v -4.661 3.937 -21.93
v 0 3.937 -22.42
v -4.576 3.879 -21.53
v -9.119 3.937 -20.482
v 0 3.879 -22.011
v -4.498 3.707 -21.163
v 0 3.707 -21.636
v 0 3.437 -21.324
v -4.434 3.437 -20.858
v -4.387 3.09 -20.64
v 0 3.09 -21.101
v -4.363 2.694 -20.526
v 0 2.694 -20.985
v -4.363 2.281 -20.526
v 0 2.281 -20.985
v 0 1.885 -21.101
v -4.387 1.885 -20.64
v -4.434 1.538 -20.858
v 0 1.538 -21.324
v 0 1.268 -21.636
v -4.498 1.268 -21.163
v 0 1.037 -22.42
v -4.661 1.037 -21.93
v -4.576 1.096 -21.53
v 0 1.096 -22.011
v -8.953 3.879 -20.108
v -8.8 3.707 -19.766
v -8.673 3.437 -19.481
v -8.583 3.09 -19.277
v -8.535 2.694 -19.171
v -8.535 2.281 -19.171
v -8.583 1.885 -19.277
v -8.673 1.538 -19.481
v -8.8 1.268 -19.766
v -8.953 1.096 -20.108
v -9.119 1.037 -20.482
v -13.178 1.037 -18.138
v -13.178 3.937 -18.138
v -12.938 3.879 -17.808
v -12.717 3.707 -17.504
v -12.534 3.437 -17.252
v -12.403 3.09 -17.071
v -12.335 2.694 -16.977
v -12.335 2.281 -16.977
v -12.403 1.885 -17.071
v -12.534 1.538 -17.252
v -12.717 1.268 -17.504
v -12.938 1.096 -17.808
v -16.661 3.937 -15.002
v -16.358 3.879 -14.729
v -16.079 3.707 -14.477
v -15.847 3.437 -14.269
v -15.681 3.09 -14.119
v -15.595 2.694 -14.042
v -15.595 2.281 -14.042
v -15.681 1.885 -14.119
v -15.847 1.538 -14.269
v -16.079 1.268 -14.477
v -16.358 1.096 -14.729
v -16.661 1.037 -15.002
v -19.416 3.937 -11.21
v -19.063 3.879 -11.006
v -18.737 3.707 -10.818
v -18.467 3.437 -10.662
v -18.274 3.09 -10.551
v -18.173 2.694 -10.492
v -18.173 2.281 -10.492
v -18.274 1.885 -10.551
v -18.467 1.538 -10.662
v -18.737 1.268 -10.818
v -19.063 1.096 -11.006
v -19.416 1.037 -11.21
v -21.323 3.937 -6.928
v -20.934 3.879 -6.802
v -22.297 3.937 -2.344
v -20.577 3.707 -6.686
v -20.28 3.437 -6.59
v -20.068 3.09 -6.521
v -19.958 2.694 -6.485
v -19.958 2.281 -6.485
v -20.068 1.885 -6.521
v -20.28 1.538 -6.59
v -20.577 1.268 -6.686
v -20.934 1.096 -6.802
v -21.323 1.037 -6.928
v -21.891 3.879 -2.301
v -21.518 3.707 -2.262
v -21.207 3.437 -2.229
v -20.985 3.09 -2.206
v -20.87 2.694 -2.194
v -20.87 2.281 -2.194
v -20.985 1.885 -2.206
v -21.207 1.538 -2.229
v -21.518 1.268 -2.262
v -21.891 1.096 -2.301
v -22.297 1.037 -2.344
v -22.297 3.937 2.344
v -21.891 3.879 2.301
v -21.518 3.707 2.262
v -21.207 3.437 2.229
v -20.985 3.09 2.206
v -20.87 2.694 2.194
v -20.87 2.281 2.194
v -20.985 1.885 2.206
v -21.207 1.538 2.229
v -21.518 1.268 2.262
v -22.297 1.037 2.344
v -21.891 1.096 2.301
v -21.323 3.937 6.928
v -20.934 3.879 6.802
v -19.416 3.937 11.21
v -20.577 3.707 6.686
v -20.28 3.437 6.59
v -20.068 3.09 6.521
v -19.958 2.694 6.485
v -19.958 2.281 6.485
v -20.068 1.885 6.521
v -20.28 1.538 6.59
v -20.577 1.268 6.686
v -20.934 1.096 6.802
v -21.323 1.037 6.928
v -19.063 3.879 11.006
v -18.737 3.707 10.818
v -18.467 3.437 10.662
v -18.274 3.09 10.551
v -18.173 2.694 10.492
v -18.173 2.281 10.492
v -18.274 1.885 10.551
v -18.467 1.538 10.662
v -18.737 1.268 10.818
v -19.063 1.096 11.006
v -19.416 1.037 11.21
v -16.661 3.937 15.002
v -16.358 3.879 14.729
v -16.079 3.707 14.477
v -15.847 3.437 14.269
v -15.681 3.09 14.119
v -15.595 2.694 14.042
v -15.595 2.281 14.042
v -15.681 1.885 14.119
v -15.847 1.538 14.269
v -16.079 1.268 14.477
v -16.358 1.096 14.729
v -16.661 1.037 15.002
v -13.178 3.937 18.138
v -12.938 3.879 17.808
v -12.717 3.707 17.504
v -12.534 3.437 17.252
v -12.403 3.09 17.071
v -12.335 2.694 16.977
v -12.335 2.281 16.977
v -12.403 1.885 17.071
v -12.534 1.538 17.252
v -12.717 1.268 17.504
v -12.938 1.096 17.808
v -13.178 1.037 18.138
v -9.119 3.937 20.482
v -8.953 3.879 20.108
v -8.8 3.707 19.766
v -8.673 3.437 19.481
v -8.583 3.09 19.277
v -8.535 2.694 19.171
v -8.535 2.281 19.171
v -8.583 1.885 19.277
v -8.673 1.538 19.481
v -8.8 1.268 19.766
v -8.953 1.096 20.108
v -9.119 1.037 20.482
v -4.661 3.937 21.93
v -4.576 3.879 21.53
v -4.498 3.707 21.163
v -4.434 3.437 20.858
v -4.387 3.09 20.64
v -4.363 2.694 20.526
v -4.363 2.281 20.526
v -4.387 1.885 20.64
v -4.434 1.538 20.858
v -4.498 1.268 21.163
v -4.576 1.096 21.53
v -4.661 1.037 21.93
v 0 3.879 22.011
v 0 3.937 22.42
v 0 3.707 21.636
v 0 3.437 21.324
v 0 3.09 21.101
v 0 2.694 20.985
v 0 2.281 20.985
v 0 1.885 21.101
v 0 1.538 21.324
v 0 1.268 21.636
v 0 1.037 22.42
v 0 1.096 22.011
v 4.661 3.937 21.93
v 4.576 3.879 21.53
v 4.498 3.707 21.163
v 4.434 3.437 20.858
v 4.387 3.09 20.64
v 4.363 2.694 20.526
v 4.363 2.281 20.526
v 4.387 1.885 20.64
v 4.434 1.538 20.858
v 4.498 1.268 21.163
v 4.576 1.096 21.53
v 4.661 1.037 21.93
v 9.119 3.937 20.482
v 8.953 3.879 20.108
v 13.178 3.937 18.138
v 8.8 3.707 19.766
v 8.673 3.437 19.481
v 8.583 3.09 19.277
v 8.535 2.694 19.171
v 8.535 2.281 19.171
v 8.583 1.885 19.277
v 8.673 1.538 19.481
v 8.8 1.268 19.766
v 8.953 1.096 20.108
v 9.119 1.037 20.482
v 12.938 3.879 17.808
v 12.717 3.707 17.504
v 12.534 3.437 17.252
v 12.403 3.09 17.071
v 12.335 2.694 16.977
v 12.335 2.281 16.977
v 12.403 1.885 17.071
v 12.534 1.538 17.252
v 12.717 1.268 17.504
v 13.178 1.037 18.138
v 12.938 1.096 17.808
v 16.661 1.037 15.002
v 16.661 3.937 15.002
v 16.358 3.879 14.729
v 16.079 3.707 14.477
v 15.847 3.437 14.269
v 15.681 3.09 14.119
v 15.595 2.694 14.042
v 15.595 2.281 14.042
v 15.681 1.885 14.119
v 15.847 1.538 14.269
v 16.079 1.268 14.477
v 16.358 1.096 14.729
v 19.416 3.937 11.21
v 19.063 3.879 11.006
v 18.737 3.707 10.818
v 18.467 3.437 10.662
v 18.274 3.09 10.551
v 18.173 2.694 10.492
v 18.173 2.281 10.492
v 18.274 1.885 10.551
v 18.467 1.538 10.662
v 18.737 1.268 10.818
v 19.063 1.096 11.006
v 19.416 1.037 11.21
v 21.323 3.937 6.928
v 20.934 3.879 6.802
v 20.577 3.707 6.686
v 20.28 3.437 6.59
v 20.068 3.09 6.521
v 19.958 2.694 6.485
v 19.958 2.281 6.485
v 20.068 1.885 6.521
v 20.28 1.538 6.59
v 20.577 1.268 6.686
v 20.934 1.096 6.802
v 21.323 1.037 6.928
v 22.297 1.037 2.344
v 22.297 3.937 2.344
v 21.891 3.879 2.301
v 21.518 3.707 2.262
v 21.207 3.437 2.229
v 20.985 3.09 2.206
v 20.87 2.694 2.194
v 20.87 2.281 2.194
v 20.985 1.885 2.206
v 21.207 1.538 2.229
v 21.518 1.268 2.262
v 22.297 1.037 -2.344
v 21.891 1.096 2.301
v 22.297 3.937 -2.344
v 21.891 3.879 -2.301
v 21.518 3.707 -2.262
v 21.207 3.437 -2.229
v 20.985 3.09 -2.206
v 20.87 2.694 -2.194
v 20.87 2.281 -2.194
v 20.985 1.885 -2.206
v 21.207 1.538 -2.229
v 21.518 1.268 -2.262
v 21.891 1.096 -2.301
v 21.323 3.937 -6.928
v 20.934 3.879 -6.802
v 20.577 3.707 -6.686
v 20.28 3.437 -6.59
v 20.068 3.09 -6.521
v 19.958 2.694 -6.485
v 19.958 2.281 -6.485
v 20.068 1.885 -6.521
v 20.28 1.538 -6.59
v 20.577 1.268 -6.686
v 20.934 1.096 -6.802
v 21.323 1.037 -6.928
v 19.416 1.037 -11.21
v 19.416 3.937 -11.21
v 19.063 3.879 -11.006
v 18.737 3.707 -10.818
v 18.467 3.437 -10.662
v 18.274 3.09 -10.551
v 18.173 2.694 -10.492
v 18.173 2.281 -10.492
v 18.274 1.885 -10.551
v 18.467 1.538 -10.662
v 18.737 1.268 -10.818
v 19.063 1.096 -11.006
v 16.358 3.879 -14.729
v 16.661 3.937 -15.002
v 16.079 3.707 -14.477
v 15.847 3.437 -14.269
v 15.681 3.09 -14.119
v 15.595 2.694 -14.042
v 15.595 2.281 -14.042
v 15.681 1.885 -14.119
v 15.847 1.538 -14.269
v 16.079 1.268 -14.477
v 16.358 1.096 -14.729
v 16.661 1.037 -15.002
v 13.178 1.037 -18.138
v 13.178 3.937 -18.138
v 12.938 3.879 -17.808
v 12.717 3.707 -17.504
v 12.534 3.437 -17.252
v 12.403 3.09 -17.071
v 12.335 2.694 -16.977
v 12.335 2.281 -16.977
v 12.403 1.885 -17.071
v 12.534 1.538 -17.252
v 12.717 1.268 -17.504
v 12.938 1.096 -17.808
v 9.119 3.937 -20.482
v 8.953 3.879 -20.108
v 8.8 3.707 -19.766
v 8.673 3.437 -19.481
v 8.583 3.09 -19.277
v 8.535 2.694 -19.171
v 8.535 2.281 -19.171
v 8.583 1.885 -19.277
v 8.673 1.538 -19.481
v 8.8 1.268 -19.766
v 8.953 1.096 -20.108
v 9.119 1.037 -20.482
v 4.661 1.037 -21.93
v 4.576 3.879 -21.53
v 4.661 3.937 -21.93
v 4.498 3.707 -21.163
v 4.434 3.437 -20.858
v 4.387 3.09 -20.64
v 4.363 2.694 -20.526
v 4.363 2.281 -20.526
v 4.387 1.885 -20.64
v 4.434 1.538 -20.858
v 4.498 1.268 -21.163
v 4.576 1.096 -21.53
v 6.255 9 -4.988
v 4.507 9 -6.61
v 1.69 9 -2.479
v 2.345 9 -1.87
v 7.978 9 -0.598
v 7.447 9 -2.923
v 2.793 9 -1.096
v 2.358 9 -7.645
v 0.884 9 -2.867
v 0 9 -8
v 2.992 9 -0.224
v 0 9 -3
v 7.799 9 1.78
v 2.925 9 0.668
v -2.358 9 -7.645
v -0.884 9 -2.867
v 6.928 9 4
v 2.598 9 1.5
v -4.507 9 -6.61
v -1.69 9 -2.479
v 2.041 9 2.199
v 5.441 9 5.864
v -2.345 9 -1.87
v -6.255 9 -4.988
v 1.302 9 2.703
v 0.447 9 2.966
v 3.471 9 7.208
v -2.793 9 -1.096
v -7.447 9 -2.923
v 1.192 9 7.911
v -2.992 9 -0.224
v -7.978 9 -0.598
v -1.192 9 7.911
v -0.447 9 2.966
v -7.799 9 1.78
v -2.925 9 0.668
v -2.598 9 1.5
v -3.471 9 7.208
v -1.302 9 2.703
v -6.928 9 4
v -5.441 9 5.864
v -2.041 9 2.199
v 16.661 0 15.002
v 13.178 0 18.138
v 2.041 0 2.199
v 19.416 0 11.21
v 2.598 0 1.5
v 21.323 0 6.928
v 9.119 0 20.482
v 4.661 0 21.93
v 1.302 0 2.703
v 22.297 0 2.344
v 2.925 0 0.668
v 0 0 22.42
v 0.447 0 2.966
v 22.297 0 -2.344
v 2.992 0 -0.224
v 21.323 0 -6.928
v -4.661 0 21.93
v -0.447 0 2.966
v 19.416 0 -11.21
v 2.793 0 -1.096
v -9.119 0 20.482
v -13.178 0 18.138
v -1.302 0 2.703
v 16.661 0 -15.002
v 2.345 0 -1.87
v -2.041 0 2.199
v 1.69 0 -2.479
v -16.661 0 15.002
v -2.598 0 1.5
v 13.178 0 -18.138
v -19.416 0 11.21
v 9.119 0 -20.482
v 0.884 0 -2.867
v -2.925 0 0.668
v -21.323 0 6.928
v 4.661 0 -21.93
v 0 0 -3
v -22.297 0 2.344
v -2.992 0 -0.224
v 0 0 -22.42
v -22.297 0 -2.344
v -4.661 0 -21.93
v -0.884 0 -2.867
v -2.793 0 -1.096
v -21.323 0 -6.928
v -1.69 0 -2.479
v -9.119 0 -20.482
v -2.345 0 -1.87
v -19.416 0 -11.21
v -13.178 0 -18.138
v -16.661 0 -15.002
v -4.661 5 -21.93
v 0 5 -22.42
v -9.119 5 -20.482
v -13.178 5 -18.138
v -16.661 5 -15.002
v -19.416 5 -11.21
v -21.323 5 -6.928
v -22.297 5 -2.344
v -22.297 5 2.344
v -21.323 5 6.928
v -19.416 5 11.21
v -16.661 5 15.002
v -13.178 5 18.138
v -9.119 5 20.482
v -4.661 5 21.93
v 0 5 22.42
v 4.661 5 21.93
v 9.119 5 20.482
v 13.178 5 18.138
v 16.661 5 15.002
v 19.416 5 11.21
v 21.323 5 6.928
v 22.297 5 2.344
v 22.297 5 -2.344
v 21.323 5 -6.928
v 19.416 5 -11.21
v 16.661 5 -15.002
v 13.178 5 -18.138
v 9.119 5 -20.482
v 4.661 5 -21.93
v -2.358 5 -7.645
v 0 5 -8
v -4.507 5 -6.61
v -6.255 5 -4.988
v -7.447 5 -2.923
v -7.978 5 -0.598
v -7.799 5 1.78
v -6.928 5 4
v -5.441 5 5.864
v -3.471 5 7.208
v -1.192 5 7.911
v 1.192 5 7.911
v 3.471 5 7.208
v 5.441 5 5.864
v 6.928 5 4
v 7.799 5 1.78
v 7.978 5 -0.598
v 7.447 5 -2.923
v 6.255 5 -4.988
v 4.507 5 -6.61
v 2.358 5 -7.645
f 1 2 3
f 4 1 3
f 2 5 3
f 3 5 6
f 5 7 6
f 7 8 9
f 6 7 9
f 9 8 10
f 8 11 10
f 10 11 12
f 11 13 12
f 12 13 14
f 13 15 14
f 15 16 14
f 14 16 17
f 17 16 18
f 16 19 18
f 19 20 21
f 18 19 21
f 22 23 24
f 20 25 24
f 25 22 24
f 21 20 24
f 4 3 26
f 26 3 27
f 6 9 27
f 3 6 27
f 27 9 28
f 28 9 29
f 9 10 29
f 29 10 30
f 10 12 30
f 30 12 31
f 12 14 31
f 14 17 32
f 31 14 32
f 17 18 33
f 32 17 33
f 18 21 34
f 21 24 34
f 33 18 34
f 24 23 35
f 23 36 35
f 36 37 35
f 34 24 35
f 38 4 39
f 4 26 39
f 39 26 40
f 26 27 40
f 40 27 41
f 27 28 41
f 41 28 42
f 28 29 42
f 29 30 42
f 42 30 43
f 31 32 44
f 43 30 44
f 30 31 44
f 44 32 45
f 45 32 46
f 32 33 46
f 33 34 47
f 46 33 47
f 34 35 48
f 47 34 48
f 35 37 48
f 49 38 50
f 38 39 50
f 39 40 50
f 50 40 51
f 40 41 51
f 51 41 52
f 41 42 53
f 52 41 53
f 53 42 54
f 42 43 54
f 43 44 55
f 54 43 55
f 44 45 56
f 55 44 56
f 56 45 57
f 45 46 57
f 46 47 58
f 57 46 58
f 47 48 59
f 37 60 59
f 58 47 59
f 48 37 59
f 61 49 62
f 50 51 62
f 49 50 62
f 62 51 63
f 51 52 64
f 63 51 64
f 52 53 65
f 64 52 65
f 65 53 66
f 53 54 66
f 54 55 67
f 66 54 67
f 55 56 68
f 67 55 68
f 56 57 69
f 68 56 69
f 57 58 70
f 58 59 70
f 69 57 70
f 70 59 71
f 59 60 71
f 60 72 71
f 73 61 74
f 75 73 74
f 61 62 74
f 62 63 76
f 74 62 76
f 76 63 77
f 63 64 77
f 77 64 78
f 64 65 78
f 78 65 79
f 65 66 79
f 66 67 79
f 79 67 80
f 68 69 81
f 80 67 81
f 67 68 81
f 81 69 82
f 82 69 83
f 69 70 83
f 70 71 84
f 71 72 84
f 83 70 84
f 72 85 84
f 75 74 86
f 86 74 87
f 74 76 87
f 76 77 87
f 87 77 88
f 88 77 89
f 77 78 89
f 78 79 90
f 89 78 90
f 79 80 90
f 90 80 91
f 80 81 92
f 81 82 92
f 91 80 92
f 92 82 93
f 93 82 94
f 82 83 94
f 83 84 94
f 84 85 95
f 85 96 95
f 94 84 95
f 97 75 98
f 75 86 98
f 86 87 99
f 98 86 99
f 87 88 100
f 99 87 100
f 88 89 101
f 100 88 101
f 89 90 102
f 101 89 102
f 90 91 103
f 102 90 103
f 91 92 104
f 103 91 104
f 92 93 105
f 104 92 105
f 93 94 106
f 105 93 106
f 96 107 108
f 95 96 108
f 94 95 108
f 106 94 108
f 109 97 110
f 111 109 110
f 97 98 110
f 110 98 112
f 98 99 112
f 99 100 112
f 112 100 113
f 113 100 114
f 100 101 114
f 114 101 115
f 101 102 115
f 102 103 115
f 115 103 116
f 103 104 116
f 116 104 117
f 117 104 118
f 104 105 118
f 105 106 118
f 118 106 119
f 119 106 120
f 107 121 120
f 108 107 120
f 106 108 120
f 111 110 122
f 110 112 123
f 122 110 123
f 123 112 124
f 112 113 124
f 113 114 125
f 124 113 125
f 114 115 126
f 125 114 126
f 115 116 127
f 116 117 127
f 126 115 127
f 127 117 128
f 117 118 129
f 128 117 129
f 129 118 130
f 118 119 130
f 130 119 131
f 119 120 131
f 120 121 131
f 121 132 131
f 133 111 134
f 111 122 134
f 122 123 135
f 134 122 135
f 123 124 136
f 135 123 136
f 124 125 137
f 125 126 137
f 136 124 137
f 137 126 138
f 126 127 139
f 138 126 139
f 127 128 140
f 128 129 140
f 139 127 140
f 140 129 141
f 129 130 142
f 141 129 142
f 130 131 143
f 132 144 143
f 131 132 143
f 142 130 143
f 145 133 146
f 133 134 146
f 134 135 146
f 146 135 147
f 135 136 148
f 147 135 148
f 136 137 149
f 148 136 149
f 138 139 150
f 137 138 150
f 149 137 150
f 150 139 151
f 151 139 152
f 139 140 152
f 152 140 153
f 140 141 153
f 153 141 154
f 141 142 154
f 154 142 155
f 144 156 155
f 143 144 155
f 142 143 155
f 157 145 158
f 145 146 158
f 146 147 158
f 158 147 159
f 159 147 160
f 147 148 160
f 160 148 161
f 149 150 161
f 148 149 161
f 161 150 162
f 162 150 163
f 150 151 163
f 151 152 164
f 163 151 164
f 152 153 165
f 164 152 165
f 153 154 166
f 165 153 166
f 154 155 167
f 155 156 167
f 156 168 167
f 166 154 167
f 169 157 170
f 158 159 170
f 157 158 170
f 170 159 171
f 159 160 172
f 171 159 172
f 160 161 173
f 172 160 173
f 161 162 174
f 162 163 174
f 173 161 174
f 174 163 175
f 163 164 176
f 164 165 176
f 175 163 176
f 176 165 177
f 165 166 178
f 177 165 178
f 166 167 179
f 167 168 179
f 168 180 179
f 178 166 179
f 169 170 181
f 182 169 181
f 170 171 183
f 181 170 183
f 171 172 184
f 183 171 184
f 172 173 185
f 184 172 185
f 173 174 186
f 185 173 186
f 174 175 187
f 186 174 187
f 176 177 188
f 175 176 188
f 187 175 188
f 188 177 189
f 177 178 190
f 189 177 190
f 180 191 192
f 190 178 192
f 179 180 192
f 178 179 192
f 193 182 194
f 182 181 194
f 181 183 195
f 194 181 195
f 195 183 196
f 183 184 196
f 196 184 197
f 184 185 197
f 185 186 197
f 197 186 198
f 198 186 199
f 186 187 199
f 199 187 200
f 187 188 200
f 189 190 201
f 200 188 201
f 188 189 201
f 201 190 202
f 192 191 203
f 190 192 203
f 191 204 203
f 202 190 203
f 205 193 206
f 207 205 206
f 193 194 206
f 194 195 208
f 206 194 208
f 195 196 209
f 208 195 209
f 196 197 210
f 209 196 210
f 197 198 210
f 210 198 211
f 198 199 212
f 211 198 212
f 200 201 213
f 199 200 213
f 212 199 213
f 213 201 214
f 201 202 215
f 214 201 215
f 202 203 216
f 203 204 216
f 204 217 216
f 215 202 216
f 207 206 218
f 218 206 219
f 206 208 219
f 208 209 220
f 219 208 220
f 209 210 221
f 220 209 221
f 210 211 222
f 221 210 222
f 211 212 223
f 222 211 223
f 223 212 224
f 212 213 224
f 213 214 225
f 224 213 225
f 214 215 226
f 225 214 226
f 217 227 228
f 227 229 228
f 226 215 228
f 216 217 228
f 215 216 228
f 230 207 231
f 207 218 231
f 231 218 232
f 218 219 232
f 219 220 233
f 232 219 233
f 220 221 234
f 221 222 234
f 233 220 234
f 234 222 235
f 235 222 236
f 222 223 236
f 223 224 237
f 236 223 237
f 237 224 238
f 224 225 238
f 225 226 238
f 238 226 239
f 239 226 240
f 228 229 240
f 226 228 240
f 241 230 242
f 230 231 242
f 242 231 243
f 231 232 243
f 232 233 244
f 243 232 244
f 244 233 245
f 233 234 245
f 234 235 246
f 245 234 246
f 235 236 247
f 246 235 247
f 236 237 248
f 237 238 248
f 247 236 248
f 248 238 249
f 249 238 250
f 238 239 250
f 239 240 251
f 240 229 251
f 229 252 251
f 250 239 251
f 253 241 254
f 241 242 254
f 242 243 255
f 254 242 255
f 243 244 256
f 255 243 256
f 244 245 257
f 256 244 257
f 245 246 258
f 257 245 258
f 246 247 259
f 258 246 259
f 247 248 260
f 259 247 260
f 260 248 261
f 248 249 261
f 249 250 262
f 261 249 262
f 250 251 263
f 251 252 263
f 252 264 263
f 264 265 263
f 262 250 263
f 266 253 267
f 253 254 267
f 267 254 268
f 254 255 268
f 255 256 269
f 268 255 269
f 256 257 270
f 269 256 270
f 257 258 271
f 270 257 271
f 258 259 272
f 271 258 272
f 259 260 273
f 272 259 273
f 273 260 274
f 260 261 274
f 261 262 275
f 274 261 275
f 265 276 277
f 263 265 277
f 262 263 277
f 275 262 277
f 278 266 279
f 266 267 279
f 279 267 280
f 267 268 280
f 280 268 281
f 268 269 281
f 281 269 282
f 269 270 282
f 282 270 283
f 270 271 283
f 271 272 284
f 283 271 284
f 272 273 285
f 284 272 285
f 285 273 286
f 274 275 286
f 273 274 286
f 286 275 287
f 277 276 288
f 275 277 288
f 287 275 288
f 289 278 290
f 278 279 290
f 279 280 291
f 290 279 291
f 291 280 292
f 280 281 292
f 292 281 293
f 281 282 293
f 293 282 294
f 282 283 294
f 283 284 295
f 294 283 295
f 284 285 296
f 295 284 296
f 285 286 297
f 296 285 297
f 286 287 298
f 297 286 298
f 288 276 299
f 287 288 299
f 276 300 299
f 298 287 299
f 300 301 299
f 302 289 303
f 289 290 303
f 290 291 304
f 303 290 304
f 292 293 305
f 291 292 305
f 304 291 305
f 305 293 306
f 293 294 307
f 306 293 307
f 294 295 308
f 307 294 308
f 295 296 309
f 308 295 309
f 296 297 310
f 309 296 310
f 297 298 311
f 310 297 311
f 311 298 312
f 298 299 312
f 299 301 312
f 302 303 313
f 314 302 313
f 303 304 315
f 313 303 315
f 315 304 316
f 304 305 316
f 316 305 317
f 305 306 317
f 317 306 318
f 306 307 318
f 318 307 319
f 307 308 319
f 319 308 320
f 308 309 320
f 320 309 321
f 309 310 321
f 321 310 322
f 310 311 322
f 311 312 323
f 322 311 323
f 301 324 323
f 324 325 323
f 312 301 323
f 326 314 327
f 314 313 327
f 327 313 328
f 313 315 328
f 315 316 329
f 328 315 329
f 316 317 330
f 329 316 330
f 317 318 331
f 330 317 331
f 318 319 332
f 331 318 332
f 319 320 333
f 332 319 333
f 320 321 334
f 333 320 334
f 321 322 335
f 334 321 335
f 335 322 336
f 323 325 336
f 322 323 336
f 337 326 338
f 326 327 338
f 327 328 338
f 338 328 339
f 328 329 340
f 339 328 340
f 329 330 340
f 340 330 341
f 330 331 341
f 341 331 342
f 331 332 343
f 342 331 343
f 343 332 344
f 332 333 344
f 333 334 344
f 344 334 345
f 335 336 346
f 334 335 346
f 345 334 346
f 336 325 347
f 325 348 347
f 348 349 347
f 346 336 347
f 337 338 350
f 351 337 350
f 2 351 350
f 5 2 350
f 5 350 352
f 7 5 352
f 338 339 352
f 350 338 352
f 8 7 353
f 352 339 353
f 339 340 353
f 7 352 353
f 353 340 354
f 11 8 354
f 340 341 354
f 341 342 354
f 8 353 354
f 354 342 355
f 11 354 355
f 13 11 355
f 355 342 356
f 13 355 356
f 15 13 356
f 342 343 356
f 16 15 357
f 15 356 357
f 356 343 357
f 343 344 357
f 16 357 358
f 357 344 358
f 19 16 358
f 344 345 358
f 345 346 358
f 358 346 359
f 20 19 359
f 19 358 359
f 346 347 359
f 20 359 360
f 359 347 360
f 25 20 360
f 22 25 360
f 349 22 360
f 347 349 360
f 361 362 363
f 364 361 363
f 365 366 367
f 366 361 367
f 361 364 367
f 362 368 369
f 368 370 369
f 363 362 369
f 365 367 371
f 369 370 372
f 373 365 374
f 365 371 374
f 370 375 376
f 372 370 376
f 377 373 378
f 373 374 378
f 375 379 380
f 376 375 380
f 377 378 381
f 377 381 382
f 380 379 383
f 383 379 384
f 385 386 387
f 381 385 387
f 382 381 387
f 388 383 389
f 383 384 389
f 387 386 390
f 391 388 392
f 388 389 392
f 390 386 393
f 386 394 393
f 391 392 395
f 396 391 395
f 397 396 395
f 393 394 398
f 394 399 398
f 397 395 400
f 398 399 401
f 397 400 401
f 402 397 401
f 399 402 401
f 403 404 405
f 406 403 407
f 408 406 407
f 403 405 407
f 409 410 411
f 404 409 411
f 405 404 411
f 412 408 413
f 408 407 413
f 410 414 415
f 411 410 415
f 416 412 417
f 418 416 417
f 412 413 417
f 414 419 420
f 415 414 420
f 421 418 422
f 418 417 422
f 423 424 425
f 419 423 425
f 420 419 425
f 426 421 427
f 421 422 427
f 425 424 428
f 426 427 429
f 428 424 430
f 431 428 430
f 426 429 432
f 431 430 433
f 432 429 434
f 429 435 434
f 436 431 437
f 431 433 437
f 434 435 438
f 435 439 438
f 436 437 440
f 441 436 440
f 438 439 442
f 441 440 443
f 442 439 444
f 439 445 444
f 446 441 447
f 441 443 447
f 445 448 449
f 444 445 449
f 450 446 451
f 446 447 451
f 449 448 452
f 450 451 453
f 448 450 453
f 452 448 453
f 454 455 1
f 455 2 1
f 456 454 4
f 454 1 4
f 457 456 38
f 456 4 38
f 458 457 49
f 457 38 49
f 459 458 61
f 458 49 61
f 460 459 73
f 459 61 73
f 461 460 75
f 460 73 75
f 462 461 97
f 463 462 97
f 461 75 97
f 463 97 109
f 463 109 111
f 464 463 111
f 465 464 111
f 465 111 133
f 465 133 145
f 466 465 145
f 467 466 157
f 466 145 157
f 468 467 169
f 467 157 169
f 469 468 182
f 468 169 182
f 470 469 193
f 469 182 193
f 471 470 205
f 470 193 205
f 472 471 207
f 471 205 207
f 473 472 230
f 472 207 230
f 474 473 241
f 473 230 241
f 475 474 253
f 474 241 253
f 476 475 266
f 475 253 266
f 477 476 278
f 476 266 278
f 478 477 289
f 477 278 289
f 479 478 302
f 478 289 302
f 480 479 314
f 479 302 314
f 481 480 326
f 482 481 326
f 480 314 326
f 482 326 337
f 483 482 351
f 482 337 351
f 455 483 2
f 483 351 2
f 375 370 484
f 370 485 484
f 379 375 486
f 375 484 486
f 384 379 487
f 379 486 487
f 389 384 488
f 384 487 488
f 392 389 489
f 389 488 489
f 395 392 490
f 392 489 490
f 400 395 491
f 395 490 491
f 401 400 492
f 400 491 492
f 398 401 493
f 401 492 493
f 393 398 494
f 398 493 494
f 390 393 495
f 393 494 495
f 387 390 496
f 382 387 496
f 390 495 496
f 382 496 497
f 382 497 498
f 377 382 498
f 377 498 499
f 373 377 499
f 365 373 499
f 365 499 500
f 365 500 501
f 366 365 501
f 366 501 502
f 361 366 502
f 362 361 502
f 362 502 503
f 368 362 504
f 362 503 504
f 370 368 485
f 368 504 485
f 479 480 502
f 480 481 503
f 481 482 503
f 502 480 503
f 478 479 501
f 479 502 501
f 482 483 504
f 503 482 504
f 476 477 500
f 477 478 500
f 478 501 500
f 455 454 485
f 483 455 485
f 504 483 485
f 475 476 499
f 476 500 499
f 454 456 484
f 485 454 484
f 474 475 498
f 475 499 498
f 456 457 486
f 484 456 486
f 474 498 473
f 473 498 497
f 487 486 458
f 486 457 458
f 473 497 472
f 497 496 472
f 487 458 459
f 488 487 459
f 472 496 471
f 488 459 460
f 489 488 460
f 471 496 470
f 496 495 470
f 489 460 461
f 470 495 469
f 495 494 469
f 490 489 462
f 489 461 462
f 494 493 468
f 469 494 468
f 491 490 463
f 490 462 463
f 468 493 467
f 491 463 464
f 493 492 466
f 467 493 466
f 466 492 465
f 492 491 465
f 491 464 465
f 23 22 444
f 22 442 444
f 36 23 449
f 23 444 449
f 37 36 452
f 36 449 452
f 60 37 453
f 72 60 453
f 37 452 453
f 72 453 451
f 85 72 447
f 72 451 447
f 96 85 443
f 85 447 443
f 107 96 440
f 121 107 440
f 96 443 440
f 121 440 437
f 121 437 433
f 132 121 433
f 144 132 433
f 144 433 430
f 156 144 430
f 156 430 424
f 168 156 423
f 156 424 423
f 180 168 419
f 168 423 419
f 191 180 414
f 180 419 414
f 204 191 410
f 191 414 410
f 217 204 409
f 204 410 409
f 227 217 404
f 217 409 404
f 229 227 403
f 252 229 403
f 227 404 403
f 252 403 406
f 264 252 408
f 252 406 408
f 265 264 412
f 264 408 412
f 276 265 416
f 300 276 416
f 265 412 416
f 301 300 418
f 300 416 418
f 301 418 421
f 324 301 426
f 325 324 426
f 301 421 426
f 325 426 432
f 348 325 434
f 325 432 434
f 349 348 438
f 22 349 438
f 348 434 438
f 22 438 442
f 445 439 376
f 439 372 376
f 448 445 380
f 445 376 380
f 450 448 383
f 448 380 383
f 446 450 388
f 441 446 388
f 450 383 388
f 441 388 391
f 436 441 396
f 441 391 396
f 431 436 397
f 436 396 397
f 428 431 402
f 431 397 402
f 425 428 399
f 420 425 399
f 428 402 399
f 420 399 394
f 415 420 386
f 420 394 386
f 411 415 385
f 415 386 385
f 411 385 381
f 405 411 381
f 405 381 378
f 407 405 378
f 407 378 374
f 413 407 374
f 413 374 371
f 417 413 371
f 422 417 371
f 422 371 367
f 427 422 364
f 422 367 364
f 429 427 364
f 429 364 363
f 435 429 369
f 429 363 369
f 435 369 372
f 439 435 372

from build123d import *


with BuildPart() as part:
    # Esquisse1 → Révolution1 (revolve)
    with BuildSketch(Plane.XY, mode=Mode.PRIVATE) as r_volution1_sk:
        with BuildLine():
            ThreePointArc((22.42, 3.937322098), (20.97, 2.487322098), (22.42, 1.037322098))
            Line((22.42, 1.037322098), (22.42, 0))
            Line((22.42, 0), (23.97, 0))
            Line((23.97, 0), (3, 0))
            Line((3, 0), (3, 5))
            Line((3, 5), (3, 9))
            Line((3, 9), (8, 9))
            Line((8, 9), (8, 5))
            Line((8, 5), (23.97, 5))
            Line((23.97, 5), (22.42, 5))
            Line((22.42, 5), (22.42, 3.937322098))
        make_face()
    revolve(r_volution1_sk.sketch.rotate(Axis((0, 0, 0), (0, 1, 0)), 90), axis=Axis((0, 0, 0), (0, 1, 0)))


solid = part.part
